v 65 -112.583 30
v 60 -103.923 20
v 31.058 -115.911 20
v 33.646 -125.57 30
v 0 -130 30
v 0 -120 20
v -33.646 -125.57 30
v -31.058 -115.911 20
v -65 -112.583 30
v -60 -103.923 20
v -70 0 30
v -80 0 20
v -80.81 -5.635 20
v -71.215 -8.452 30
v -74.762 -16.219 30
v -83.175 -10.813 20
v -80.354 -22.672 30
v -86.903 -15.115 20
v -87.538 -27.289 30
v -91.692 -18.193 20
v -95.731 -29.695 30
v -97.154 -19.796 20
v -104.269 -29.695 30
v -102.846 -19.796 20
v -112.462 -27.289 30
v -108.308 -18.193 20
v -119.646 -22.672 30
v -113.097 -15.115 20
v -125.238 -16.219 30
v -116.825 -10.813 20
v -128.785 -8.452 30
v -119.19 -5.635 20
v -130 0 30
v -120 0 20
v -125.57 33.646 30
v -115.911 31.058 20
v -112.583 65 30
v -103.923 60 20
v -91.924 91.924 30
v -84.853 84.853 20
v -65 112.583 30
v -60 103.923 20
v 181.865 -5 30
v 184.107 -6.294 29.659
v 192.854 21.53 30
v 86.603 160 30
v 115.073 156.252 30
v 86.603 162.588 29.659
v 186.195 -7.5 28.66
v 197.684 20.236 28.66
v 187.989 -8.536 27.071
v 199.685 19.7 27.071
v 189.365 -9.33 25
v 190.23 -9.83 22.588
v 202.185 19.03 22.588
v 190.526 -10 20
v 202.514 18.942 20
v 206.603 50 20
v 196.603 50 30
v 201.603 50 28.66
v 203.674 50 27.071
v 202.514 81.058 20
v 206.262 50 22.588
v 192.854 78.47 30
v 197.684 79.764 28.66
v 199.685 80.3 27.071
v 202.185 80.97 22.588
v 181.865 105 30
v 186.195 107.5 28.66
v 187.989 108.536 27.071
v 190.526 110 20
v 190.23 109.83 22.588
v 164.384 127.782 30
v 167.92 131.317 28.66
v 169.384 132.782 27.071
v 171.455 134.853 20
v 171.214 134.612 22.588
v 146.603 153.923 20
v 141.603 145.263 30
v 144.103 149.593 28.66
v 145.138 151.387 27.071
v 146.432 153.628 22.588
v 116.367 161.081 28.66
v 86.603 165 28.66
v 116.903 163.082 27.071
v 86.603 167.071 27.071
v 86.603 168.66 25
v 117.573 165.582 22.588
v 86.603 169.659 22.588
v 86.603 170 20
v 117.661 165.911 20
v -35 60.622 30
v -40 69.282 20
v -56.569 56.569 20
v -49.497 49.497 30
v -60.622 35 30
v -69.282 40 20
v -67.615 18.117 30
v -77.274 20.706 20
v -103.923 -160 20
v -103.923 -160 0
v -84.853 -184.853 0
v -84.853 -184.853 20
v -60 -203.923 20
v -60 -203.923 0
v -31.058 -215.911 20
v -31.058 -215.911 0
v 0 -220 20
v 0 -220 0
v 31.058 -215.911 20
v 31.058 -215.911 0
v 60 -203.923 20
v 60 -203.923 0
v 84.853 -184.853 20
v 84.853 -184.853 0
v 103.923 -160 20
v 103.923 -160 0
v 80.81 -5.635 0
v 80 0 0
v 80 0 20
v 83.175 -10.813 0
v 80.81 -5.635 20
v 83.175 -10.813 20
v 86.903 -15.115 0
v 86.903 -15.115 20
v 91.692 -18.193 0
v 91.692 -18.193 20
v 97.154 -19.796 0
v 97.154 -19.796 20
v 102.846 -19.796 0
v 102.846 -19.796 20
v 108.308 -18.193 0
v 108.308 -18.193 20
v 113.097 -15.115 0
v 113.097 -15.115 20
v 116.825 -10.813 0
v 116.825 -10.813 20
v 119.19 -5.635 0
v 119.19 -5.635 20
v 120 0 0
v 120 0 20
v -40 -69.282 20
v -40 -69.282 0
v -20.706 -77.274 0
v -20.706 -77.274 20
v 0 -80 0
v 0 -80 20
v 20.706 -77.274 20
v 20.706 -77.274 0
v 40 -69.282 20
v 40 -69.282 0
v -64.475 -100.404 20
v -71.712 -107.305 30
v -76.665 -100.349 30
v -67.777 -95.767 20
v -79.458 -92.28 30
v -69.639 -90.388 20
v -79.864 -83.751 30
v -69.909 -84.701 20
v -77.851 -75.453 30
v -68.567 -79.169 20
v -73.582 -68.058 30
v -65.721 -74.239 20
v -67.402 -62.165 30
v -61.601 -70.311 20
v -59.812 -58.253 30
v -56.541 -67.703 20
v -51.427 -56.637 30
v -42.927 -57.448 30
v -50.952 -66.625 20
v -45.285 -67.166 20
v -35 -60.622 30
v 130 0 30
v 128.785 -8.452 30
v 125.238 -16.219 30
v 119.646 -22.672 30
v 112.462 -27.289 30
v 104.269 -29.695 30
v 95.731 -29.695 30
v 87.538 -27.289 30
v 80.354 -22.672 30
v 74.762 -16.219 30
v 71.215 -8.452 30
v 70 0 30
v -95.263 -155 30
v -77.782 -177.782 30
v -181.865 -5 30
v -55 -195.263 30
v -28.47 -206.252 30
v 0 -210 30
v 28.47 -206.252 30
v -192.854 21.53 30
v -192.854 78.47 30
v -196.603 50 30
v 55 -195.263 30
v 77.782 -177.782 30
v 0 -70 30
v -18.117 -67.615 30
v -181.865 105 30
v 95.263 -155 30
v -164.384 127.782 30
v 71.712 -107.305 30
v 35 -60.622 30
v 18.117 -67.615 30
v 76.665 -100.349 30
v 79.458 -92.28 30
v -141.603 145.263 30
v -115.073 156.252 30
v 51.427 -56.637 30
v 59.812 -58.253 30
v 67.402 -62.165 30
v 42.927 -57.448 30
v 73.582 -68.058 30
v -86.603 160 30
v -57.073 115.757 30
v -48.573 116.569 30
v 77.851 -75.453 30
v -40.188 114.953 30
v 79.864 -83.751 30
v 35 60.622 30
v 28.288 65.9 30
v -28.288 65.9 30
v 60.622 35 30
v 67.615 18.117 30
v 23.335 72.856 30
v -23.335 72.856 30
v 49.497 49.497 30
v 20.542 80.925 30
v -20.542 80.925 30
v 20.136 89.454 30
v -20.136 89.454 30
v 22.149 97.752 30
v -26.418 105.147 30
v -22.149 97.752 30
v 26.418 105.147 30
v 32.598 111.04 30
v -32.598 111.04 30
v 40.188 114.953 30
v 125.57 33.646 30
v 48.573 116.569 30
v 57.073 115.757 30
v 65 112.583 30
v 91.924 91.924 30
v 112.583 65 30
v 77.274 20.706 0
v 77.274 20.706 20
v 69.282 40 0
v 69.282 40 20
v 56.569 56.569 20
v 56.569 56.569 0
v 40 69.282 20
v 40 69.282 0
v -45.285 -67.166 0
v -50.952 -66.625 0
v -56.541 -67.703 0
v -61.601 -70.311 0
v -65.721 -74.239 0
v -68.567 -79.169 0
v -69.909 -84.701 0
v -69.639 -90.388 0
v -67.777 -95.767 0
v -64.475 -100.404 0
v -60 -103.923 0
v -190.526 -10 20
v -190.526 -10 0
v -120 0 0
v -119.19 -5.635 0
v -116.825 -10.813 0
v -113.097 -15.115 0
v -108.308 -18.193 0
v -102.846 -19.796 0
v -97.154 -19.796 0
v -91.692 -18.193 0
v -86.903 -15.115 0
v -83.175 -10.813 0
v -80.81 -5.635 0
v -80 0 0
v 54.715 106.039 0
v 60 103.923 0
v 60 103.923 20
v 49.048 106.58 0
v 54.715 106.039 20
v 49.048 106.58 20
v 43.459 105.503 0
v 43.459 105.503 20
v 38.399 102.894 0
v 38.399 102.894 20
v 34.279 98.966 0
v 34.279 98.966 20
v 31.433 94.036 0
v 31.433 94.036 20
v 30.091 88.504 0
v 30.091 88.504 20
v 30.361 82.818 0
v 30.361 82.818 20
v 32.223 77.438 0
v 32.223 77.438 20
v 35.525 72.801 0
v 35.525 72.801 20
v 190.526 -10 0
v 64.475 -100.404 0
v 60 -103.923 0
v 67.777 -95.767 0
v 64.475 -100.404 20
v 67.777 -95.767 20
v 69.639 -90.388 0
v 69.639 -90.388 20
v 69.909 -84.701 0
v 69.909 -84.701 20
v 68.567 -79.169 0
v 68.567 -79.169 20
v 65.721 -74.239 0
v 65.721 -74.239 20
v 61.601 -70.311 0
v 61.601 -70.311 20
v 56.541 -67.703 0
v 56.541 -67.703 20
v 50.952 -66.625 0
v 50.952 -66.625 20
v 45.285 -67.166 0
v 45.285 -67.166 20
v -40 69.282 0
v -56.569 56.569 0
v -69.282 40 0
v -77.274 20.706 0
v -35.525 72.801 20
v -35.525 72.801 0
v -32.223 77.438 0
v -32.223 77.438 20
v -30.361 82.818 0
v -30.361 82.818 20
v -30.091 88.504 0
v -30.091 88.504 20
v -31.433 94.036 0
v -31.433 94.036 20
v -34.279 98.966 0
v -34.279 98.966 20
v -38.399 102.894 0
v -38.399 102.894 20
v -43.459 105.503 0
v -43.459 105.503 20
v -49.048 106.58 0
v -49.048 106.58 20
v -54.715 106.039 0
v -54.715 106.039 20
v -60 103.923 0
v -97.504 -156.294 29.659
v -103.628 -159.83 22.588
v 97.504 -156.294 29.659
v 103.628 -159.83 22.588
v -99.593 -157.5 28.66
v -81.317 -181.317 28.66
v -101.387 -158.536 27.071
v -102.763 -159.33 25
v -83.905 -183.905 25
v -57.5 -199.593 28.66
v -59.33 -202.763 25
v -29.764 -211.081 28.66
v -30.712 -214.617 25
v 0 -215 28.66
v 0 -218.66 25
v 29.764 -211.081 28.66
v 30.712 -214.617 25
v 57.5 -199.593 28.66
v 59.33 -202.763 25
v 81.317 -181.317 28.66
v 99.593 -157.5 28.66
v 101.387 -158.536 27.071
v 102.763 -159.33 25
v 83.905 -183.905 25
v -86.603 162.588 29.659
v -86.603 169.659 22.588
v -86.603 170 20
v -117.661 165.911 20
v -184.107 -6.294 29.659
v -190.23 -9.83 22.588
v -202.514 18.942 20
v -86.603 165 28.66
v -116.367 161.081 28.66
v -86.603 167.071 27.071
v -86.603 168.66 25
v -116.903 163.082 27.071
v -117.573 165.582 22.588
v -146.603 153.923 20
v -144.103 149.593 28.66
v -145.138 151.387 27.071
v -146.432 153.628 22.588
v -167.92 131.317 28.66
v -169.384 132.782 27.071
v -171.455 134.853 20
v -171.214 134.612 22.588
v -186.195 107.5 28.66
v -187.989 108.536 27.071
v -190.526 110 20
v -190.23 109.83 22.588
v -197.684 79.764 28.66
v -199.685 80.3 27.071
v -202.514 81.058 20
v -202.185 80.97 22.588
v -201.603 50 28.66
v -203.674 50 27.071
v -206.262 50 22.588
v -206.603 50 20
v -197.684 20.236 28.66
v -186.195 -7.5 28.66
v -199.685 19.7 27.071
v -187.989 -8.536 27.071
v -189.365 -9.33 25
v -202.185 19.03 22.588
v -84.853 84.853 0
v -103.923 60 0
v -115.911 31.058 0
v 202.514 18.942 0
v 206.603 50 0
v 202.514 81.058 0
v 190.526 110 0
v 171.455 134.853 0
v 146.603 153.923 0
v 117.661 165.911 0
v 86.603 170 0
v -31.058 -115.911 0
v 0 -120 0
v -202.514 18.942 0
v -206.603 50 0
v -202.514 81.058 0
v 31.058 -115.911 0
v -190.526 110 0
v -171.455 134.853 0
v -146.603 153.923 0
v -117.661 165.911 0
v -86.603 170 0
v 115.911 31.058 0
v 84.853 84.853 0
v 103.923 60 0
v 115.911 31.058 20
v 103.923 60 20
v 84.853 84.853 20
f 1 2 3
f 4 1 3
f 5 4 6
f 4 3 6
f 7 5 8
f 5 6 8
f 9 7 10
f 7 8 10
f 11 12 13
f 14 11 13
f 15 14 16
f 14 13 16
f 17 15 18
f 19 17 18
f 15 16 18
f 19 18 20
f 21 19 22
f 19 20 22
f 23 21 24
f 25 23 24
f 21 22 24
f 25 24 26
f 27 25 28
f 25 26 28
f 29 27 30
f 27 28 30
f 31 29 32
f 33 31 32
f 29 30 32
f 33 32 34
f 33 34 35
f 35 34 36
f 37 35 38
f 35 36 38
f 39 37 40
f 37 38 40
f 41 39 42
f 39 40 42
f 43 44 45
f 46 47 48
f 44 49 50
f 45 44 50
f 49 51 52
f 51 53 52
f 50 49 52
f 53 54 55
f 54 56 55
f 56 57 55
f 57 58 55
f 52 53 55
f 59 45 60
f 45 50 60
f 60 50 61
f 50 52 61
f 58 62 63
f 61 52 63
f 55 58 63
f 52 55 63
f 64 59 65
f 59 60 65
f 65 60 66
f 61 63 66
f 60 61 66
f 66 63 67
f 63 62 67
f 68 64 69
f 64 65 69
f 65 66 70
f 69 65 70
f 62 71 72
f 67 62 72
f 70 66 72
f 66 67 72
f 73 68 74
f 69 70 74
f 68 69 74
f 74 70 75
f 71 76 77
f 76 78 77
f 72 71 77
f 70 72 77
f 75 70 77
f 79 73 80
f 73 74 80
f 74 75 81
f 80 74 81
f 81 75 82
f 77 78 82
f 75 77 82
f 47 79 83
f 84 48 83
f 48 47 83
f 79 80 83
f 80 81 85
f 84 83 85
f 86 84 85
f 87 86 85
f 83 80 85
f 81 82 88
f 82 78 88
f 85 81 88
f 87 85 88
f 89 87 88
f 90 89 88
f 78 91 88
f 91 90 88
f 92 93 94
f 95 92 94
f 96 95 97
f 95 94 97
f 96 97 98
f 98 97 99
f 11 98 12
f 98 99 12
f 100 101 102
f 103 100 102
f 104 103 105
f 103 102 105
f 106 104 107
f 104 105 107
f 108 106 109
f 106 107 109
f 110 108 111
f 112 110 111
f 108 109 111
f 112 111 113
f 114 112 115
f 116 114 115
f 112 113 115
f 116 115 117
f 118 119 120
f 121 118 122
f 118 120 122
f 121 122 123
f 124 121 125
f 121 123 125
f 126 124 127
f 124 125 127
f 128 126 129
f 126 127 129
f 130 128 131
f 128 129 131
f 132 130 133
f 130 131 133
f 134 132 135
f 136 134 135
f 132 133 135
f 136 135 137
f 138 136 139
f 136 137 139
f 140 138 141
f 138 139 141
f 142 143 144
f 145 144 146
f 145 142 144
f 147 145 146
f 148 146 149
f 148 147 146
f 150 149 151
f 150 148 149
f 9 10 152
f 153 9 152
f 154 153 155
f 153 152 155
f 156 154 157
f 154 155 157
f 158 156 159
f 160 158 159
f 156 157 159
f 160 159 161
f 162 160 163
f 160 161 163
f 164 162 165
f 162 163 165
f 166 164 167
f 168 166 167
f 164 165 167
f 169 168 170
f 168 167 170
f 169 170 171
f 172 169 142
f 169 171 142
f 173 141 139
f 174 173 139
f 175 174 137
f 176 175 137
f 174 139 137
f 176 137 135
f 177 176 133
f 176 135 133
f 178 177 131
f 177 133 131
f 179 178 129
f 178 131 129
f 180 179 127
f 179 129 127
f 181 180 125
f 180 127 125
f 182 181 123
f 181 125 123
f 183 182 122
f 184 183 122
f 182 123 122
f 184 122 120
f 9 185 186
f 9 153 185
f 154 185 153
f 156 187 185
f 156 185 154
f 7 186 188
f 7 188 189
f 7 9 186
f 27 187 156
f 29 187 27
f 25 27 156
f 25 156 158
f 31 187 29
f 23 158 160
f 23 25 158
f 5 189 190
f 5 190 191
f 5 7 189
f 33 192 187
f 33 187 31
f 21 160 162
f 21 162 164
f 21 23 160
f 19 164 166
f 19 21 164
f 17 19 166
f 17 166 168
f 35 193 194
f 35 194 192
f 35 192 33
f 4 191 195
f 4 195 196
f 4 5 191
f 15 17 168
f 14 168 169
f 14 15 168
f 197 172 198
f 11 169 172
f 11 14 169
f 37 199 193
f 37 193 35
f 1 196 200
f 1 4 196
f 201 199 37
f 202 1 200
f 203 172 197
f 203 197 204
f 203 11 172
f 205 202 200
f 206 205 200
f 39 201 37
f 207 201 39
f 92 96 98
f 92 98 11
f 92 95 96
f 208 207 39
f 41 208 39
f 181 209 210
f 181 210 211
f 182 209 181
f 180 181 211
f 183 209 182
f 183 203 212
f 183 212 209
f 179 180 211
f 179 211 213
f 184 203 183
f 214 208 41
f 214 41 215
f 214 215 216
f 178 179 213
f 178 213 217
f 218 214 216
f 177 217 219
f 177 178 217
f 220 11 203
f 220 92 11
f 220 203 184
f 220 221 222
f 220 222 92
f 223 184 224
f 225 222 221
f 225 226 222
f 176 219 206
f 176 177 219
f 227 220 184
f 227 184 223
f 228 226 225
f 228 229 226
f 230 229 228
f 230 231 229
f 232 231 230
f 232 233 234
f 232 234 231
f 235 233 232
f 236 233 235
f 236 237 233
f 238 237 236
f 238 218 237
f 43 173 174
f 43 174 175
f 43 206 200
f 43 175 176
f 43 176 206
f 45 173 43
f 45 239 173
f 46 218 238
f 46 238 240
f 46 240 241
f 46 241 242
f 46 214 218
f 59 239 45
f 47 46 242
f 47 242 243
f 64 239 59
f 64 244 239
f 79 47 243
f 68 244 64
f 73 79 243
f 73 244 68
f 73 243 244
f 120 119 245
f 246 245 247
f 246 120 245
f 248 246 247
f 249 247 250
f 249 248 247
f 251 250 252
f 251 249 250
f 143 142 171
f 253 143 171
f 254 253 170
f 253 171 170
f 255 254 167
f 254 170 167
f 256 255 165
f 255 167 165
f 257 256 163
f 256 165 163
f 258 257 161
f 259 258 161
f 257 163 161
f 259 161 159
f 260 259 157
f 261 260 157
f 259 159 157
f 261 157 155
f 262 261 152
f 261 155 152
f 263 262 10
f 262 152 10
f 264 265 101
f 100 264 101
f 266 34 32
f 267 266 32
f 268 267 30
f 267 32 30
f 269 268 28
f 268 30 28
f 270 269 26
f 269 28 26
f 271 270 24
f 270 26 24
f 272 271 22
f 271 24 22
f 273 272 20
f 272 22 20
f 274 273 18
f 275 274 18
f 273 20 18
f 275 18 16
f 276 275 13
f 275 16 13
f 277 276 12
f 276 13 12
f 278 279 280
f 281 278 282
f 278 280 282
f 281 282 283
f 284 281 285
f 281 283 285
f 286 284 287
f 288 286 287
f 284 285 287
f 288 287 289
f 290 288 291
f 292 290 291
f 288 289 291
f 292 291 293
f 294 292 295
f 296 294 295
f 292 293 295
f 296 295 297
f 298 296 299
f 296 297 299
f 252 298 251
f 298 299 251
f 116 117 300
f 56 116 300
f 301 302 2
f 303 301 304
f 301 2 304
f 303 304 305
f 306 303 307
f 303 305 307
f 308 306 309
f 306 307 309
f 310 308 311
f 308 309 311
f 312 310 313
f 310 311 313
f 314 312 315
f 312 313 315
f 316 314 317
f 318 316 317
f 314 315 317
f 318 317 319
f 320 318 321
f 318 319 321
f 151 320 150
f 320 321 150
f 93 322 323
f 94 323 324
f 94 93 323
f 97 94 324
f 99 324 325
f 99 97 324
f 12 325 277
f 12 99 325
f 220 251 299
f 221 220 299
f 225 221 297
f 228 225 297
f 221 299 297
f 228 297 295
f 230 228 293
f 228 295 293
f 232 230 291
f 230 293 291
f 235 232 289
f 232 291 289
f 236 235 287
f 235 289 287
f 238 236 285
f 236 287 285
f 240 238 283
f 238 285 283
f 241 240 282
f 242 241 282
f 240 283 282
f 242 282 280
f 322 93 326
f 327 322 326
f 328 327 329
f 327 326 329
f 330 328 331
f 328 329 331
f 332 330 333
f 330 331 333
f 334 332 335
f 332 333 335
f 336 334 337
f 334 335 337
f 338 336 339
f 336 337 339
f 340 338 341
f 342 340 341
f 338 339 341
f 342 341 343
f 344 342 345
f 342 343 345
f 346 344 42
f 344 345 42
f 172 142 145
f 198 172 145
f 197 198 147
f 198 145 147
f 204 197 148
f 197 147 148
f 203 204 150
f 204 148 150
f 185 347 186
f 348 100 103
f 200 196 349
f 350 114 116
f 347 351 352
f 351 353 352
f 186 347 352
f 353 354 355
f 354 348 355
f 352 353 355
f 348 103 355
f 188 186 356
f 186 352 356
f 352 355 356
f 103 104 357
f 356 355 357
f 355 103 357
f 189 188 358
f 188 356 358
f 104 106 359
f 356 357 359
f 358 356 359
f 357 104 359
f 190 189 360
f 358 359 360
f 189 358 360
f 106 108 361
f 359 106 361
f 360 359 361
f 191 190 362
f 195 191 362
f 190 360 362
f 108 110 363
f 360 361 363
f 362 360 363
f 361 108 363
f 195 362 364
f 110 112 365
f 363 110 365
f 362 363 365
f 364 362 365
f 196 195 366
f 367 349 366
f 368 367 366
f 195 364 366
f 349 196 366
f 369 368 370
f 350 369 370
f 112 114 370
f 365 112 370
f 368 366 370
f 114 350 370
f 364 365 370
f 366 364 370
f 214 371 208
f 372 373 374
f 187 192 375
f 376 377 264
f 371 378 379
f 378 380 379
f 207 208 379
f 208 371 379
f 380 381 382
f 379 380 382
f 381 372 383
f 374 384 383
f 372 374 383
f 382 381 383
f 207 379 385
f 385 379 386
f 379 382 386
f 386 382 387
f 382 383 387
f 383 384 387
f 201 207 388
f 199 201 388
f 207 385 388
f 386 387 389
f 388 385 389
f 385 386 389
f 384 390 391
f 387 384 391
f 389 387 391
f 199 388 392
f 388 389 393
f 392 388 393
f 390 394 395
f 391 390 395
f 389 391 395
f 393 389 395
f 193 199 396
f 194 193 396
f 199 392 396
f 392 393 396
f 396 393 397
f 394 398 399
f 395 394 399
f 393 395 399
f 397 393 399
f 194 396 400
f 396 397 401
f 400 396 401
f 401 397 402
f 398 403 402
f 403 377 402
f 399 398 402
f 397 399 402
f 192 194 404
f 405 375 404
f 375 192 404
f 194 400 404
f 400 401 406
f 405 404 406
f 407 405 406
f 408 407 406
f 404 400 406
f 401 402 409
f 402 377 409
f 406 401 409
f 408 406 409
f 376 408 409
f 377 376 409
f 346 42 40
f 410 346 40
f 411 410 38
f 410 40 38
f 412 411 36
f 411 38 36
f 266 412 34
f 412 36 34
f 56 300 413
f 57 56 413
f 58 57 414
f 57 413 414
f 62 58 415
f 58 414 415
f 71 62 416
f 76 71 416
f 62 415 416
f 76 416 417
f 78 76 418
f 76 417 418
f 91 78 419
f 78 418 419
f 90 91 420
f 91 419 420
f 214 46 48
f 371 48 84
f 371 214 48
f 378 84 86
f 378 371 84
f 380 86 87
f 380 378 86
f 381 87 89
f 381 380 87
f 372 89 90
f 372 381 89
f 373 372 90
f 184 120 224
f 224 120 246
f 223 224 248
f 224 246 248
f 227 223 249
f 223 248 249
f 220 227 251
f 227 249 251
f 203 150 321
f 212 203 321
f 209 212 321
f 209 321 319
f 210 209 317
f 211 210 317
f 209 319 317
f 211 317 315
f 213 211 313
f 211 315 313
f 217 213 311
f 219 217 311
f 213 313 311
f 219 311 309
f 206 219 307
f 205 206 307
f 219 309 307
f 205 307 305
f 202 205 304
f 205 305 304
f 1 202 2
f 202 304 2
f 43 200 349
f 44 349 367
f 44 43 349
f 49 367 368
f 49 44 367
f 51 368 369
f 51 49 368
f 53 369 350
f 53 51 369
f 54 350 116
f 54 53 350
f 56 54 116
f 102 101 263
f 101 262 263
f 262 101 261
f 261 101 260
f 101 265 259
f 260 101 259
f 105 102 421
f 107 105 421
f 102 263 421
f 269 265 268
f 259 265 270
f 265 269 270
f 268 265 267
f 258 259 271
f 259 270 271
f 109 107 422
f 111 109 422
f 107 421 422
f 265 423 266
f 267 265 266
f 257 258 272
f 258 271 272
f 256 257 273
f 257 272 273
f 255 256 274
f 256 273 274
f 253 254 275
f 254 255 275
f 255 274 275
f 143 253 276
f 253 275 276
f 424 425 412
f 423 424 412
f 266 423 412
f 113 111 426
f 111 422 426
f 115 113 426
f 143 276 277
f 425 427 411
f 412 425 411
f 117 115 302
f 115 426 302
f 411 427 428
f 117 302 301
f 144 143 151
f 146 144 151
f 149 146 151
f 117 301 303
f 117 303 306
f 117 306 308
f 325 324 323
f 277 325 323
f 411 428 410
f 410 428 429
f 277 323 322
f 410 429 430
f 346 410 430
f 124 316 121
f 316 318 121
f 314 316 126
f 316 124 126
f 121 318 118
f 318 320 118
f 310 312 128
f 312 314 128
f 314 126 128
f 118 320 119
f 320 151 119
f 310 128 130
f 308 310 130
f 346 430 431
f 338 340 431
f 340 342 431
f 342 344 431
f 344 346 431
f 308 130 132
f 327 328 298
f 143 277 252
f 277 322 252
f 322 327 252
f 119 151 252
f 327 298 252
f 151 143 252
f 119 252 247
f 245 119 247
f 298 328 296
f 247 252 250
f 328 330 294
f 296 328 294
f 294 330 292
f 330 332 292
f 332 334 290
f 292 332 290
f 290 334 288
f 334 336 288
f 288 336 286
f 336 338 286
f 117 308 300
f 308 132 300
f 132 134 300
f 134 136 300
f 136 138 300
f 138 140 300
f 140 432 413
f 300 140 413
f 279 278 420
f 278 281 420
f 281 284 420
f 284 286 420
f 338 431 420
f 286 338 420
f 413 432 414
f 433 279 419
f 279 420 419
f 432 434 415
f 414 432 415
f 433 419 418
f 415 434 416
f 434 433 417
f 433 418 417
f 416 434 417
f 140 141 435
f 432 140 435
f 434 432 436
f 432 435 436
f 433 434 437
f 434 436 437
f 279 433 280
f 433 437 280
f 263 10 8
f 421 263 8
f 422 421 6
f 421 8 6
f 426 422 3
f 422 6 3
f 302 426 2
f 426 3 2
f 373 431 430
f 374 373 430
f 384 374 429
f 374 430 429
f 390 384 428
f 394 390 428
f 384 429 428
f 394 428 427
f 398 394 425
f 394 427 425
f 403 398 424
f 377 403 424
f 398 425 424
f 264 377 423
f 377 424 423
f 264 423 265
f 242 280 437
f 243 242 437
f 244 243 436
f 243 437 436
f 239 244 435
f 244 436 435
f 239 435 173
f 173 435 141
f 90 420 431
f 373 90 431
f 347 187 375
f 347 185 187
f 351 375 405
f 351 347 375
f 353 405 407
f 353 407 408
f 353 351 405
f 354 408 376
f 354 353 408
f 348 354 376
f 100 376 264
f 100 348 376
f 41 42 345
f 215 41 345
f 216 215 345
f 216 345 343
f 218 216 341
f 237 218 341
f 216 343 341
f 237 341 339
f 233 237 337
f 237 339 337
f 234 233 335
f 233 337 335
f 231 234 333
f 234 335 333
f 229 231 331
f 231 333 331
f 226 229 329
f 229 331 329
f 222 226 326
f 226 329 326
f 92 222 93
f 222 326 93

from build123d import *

# Parameters (mm, degrees)
PAD_DEPTH          = 30
POCKET_DEPTH       = 1167.961349
POLARPATTERN_COUNT = 3
CHAMFER_SIZE       = 10
FILLET_R           = 10


with BuildPart() as part:
    # Sketch → Pad (new body)
    with BuildSketch(Plane.XY):
        with BuildLine():
            Line((103.923048, -160), (190.525589, -10))
            ThreePointArc((190.525589, -10), (190.525589, 110), (86.60254, 170))
            Line((86.60254, 170), (-86.60254, 170))
            ThreePointArc((-86.60254, 170), (-190.525589, 110), (-190.525589, -10))
            Line((-190.525589, -10), (-103.923048, -160))
            ThreePointArc((-103.923048, -160), (0, -220), (103.923048, -160))
        make_face()
    extrude(amount=PAD_DEPTH)

    # Sketch001 (on Face8 of Pad) → Pocket (cut, through all)
    with BuildSketch(Plane.XY.offset(30)):
        with BuildLine():
            ThreePointArc((-40, -69.282032), (-67.320508, -76.60254), (-60, -103.923048))
            ThreePointArc((-60, -103.923048), (0, -120), (60, -103.923048))
            ThreePointArc((60, -103.923048), (67.320508, -76.60254), (40, -69.282032))
            ThreePointArc((-40, -69.282032), (0, -80), (40, -69.282032))
        make_face()
    pocket = extrude(amount=-POCKET_DEPTH, mode=Mode.SUBTRACT)

    # PolarPattern: Pocket ×3 about axis
    polarpattern_axis = Axis((0, 0, 30), (0, 0, 1))
    for i in range(1, POLARPATTERN_COUNT):
        add(pocket.rotate(polarpattern_axis, i * 360 / POLARPATTERN_COUNT), mode=Mode.SUBTRACT)

    # Chamfer
    chamfer_edges = [part.edges().sort_by_distance(p)[0] for p in [
        (69.282032, 40, 30),
        (0, -80, 30),
        (-69.282032, 40, 30),
    ]]
    chamfer(chamfer_edges, length=CHAMFER_SIZE)

    # Fillet
    fillet_edges = [part.edges().sort_by_distance(p)[0] for p in [
        (0, -220, 30),
    ]]
    fillet(fillet_edges, radius=FILLET_R)


solid = part.part
